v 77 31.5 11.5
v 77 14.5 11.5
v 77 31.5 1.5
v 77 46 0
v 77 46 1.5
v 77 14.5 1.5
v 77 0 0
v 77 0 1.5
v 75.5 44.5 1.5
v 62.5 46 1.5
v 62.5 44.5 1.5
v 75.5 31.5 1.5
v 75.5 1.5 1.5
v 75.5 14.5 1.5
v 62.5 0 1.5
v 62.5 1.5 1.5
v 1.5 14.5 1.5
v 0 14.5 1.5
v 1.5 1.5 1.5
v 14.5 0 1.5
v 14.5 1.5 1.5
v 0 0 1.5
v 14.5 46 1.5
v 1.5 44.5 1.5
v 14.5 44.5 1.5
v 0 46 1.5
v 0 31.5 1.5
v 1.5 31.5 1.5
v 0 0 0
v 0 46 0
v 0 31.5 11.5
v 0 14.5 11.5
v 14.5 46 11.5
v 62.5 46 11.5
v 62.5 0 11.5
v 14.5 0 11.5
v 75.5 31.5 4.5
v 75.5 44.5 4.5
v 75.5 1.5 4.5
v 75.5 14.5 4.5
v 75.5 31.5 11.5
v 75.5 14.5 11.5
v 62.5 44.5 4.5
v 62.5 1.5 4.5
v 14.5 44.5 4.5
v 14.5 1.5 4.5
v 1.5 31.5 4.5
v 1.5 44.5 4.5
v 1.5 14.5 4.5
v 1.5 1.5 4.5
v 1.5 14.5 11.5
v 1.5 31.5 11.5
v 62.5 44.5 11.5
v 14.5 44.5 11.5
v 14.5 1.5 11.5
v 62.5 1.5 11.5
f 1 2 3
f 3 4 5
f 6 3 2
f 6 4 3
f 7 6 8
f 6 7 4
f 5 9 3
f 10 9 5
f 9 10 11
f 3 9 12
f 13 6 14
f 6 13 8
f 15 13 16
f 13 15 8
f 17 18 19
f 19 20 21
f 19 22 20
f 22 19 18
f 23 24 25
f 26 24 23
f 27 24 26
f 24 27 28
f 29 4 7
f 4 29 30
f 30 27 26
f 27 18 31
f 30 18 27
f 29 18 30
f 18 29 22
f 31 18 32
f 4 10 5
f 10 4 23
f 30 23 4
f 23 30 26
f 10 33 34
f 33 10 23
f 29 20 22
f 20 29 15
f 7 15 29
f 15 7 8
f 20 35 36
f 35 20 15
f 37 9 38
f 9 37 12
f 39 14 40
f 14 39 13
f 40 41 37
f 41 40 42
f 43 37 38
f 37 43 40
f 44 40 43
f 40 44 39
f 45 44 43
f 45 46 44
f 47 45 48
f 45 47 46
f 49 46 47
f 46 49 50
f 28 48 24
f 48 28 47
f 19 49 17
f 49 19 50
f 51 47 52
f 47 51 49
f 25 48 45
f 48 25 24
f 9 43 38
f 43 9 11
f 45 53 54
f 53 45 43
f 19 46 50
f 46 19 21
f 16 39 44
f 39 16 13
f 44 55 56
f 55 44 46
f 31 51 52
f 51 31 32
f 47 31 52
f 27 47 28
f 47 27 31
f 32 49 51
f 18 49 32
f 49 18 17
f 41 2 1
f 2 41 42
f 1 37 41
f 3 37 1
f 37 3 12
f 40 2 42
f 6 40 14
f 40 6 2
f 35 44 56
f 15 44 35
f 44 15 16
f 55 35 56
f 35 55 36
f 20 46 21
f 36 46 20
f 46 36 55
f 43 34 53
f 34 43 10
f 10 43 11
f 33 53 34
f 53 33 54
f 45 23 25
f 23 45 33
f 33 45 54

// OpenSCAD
show_box = 0;
//else show lid

card_x = 73 + 1;
card_y = 42 + 1;
card_z = 2.2;

card_sum = 22;

box_wall = 1.5;
box_hold = box_wall * 2;
box_grip = 13;

lid_grip = 10;

module grip()
{
  linear_extrude(height = (card_z * card_sum) + box_hold)
  {
    polygon(points=[[0, 0],
                    [box_grip + box_wall, 0],
                    [box_grip + box_wall, box_wall],
                    [box_wall, box_wall],
                    [box_wall, box_wall + box_grip],
                    [0, box_wall + box_grip]]);       
  }
}

if(show_box)
{
  union()
  {
    cube([card_x + (2 * box_wall), card_y + (2 * box_wall), box_wall]);
    grip();
    translate([card_x + (2 * box_wall), 0, 0])
    {
      rotate([0, 0, 90])
      {
        grip();
      }
    }
    translate([card_x + (2 * box_wall), card_y + (2 * box_wall), 0])
    {
      rotate([0, 0, 180])
      {
        grip();
      }
    }
    translate([0, card_y + (2 * box_wall), 0])
    {
      rotate([0, 0, -90])
      {
        grip();
      }
    }
  }
}
else
{
  union()
  {
    cube([card_x + (2 * box_wall), card_y + (2 * box_wall), box_wall]);
    translate([box_wall, box_wall, box_wall])
    {
      cube([card_x, card_y, box_hold]);
    }
    
    translate([0, box_wall + box_grip, box_wall])
    {
      cube([box_wall, card_y - (2 * box_grip), lid_grip]);
    }
    translate([box_wall + card_x, box_wall + box_grip, box_wall])
    {
      cube([box_wall, card_y - (2 * box_grip), lid_grip]);
    }
    translate([box_wall + box_grip, 0, box_wall])
    {
      cube([card_x - (2 * box_grip), box_wall, lid_grip]);
    }
    translate([box_wall + box_grip, box_wall + card_y, box_wall])
    {
      cube([card_x - (2 * box_grip), box_wall, lid_grip]);
    }
  }
}
